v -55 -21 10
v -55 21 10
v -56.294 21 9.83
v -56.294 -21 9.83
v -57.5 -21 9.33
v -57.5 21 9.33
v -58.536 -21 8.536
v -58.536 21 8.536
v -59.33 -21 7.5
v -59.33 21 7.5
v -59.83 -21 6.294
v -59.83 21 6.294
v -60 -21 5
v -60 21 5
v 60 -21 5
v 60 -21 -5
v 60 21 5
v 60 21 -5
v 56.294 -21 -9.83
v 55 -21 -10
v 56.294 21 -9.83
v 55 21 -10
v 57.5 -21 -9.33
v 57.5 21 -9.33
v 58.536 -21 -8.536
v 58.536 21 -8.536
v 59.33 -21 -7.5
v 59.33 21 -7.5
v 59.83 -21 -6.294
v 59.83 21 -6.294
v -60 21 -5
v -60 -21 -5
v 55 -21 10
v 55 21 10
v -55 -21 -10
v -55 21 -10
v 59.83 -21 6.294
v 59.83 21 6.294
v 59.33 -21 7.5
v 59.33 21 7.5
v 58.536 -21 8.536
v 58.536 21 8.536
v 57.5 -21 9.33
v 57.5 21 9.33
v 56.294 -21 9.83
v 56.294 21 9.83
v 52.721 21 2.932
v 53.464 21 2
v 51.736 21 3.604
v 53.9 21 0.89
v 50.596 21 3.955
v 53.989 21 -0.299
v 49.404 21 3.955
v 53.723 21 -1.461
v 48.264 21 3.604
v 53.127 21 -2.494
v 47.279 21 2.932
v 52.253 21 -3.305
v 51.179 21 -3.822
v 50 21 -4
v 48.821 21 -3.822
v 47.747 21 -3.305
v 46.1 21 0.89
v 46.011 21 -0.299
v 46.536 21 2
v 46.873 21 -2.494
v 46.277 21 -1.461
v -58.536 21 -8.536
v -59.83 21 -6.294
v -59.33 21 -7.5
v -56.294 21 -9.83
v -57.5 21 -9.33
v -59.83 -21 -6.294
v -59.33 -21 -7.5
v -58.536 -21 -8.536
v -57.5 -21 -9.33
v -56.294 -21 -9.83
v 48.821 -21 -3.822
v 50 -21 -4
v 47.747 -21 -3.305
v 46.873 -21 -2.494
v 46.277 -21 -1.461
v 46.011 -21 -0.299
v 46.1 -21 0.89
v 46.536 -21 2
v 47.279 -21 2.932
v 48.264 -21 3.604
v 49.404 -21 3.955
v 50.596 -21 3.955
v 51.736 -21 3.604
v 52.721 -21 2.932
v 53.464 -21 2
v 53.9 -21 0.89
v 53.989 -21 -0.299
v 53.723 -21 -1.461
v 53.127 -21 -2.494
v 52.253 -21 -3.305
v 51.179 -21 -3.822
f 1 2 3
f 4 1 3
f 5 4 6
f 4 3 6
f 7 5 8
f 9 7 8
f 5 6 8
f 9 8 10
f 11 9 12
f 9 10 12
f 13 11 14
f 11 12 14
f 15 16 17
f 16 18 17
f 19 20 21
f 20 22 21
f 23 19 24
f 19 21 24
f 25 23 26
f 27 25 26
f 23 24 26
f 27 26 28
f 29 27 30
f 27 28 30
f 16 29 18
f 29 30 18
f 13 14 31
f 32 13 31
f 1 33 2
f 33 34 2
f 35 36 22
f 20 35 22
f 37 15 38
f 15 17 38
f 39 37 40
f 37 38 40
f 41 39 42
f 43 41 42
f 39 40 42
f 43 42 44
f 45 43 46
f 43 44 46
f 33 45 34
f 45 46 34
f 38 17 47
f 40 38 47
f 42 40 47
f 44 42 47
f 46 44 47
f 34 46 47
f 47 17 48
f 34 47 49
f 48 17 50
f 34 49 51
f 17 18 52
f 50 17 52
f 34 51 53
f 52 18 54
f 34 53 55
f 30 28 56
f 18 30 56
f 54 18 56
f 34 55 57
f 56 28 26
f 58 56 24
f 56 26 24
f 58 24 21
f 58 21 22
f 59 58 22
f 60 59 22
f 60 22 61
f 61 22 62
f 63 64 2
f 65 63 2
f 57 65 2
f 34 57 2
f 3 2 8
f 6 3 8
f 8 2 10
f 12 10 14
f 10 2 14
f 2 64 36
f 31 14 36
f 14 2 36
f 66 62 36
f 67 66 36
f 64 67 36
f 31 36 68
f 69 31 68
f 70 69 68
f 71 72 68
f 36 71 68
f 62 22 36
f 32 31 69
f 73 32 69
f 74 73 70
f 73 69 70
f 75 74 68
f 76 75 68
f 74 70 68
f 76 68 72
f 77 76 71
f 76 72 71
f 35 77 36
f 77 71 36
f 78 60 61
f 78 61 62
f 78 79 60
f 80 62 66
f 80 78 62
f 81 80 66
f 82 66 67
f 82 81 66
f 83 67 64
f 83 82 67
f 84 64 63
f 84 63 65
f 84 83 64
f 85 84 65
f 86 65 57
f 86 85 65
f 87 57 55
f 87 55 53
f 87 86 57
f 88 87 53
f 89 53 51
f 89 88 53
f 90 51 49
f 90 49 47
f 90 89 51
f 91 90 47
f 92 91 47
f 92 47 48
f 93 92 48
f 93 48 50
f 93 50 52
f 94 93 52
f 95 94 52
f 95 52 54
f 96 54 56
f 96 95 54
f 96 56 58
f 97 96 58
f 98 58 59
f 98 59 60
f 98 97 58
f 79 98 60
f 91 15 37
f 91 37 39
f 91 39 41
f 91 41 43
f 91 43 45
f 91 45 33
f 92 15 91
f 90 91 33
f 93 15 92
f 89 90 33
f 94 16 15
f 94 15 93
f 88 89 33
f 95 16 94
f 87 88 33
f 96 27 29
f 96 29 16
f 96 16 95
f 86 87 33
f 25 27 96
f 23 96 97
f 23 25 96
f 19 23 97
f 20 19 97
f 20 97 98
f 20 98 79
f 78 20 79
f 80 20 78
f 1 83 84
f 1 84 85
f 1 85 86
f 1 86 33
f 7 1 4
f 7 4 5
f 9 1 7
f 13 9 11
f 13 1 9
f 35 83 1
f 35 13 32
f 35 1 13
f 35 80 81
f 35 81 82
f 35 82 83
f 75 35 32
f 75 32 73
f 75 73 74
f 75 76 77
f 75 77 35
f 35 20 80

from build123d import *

# Parameters (mm, degrees)
SKETCH_1_R      = 4
EXTRUDE_1_DEPTH = 21


with BuildPart() as part:
    # 草图1 → 凸台-拉伸1 (new, symmetric)
    with BuildSketch(Plane(origin=(0, 0, 0), x_dir=(1, 0, 0), z_dir=(0, 1, 0))):
        with BuildLine():
            Line((-55, 10), (55, 10))
            ThreePointArc((55, 10), (58.535533906, 8.535533906), (60, 5))
            Line((60, 5), (60, -5))
            ThreePointArc((60, -5), (58.535533906, -8.535533906), (55, -10))
            Line((55, -10), (-55, -10))
            ThreePointArc((-55, -10), (-58.535533906, -8.535533906), (-60, -5))
            Line((-60, -5), (-60, 5))
            ThreePointArc((-60, 5), (-58.535533906, 8.535533906), (-55, 10))
        make_face()
        with Locations(Location((50, 0, 0), (0, 0, 90))):
            Circle(SKETCH_1_R, mode=Mode.SUBTRACT)
    extrude(amount=EXTRUDE_1_DEPTH, both=True)


solid = part.part
